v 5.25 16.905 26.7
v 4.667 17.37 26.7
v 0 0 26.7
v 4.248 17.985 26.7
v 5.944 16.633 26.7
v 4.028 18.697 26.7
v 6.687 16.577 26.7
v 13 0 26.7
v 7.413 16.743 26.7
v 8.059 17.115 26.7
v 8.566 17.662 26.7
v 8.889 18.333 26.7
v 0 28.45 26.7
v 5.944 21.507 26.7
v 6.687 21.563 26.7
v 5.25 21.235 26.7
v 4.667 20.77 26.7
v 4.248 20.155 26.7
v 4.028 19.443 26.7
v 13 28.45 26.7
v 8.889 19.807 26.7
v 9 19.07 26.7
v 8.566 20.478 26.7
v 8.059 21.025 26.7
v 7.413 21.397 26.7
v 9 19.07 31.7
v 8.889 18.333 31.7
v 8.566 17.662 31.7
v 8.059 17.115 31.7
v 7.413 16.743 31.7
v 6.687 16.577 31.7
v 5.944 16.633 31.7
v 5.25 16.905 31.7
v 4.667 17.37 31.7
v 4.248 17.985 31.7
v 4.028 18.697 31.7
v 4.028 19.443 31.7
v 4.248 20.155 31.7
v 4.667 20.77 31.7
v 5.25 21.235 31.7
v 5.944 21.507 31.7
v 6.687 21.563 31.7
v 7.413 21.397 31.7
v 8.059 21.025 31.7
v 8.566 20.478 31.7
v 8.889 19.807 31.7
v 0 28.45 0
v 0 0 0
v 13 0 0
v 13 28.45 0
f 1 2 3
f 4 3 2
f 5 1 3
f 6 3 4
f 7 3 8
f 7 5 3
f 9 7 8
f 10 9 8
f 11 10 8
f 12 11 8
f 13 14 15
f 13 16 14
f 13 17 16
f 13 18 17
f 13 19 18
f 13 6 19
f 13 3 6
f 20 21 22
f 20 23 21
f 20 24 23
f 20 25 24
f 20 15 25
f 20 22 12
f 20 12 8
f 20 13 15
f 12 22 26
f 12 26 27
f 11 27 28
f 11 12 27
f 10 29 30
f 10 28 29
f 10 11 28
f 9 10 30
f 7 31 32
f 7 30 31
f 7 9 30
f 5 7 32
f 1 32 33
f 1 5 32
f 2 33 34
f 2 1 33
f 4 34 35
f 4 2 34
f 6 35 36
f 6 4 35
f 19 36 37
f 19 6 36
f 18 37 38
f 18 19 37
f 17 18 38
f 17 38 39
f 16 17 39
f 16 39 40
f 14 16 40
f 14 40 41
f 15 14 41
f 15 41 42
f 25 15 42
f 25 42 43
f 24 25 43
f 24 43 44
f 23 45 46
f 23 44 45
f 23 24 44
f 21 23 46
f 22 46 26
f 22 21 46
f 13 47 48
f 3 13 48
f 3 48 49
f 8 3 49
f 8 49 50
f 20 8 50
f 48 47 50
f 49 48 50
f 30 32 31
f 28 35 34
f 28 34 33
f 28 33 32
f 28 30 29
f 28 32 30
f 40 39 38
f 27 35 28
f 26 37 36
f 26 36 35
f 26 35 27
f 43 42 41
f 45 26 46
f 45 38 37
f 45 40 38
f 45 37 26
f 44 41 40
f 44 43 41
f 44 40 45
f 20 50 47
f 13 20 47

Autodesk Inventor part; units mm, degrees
ref_plane "YZ Plane" through (0, 0, 0) normal (1, 0, 0) x (0, 1, 0)
ref_plane "XZ Plane" through (0, 0, 0) normal (0, 1, 0) x (-1, 0, 0)
ref_plane "XY Plane" through (0, 0, 0) normal (0, 0, 1) x (1, 0, 0)
sketch "Sketch1" plane through (0, 0, 0) normal (0, 0, 1) x (1, 0, 0)
  line L0 (0, 0) -> (13, 0)
  line L1 (13, 0) -> (13, 28.45)
  line L2 (13, 28.45) -> (0, 28.45)
  line L3 (0, 28.45) -> (0, 0)
  dimension "d0" = 13
  dimension "d1" = 28.45
extrude "Extrusion1" add sketch "Sketch1" along normal blind 26.7
sketch "Sketch2" plane through (0, 0, 26.7) normal (0, 0, 1) x (1, 0, 0)
  line L0 (13, 28.45) -> (0, 28.45) projected
  circle A0 centre (6.5, 19.07) radius 2.5
  point P0 (0, 0)
  dimension "d5" = 5
extrude "Extrusion2" add sketch "Sketch2" along normal blind 5
properties part number "servoRep"
